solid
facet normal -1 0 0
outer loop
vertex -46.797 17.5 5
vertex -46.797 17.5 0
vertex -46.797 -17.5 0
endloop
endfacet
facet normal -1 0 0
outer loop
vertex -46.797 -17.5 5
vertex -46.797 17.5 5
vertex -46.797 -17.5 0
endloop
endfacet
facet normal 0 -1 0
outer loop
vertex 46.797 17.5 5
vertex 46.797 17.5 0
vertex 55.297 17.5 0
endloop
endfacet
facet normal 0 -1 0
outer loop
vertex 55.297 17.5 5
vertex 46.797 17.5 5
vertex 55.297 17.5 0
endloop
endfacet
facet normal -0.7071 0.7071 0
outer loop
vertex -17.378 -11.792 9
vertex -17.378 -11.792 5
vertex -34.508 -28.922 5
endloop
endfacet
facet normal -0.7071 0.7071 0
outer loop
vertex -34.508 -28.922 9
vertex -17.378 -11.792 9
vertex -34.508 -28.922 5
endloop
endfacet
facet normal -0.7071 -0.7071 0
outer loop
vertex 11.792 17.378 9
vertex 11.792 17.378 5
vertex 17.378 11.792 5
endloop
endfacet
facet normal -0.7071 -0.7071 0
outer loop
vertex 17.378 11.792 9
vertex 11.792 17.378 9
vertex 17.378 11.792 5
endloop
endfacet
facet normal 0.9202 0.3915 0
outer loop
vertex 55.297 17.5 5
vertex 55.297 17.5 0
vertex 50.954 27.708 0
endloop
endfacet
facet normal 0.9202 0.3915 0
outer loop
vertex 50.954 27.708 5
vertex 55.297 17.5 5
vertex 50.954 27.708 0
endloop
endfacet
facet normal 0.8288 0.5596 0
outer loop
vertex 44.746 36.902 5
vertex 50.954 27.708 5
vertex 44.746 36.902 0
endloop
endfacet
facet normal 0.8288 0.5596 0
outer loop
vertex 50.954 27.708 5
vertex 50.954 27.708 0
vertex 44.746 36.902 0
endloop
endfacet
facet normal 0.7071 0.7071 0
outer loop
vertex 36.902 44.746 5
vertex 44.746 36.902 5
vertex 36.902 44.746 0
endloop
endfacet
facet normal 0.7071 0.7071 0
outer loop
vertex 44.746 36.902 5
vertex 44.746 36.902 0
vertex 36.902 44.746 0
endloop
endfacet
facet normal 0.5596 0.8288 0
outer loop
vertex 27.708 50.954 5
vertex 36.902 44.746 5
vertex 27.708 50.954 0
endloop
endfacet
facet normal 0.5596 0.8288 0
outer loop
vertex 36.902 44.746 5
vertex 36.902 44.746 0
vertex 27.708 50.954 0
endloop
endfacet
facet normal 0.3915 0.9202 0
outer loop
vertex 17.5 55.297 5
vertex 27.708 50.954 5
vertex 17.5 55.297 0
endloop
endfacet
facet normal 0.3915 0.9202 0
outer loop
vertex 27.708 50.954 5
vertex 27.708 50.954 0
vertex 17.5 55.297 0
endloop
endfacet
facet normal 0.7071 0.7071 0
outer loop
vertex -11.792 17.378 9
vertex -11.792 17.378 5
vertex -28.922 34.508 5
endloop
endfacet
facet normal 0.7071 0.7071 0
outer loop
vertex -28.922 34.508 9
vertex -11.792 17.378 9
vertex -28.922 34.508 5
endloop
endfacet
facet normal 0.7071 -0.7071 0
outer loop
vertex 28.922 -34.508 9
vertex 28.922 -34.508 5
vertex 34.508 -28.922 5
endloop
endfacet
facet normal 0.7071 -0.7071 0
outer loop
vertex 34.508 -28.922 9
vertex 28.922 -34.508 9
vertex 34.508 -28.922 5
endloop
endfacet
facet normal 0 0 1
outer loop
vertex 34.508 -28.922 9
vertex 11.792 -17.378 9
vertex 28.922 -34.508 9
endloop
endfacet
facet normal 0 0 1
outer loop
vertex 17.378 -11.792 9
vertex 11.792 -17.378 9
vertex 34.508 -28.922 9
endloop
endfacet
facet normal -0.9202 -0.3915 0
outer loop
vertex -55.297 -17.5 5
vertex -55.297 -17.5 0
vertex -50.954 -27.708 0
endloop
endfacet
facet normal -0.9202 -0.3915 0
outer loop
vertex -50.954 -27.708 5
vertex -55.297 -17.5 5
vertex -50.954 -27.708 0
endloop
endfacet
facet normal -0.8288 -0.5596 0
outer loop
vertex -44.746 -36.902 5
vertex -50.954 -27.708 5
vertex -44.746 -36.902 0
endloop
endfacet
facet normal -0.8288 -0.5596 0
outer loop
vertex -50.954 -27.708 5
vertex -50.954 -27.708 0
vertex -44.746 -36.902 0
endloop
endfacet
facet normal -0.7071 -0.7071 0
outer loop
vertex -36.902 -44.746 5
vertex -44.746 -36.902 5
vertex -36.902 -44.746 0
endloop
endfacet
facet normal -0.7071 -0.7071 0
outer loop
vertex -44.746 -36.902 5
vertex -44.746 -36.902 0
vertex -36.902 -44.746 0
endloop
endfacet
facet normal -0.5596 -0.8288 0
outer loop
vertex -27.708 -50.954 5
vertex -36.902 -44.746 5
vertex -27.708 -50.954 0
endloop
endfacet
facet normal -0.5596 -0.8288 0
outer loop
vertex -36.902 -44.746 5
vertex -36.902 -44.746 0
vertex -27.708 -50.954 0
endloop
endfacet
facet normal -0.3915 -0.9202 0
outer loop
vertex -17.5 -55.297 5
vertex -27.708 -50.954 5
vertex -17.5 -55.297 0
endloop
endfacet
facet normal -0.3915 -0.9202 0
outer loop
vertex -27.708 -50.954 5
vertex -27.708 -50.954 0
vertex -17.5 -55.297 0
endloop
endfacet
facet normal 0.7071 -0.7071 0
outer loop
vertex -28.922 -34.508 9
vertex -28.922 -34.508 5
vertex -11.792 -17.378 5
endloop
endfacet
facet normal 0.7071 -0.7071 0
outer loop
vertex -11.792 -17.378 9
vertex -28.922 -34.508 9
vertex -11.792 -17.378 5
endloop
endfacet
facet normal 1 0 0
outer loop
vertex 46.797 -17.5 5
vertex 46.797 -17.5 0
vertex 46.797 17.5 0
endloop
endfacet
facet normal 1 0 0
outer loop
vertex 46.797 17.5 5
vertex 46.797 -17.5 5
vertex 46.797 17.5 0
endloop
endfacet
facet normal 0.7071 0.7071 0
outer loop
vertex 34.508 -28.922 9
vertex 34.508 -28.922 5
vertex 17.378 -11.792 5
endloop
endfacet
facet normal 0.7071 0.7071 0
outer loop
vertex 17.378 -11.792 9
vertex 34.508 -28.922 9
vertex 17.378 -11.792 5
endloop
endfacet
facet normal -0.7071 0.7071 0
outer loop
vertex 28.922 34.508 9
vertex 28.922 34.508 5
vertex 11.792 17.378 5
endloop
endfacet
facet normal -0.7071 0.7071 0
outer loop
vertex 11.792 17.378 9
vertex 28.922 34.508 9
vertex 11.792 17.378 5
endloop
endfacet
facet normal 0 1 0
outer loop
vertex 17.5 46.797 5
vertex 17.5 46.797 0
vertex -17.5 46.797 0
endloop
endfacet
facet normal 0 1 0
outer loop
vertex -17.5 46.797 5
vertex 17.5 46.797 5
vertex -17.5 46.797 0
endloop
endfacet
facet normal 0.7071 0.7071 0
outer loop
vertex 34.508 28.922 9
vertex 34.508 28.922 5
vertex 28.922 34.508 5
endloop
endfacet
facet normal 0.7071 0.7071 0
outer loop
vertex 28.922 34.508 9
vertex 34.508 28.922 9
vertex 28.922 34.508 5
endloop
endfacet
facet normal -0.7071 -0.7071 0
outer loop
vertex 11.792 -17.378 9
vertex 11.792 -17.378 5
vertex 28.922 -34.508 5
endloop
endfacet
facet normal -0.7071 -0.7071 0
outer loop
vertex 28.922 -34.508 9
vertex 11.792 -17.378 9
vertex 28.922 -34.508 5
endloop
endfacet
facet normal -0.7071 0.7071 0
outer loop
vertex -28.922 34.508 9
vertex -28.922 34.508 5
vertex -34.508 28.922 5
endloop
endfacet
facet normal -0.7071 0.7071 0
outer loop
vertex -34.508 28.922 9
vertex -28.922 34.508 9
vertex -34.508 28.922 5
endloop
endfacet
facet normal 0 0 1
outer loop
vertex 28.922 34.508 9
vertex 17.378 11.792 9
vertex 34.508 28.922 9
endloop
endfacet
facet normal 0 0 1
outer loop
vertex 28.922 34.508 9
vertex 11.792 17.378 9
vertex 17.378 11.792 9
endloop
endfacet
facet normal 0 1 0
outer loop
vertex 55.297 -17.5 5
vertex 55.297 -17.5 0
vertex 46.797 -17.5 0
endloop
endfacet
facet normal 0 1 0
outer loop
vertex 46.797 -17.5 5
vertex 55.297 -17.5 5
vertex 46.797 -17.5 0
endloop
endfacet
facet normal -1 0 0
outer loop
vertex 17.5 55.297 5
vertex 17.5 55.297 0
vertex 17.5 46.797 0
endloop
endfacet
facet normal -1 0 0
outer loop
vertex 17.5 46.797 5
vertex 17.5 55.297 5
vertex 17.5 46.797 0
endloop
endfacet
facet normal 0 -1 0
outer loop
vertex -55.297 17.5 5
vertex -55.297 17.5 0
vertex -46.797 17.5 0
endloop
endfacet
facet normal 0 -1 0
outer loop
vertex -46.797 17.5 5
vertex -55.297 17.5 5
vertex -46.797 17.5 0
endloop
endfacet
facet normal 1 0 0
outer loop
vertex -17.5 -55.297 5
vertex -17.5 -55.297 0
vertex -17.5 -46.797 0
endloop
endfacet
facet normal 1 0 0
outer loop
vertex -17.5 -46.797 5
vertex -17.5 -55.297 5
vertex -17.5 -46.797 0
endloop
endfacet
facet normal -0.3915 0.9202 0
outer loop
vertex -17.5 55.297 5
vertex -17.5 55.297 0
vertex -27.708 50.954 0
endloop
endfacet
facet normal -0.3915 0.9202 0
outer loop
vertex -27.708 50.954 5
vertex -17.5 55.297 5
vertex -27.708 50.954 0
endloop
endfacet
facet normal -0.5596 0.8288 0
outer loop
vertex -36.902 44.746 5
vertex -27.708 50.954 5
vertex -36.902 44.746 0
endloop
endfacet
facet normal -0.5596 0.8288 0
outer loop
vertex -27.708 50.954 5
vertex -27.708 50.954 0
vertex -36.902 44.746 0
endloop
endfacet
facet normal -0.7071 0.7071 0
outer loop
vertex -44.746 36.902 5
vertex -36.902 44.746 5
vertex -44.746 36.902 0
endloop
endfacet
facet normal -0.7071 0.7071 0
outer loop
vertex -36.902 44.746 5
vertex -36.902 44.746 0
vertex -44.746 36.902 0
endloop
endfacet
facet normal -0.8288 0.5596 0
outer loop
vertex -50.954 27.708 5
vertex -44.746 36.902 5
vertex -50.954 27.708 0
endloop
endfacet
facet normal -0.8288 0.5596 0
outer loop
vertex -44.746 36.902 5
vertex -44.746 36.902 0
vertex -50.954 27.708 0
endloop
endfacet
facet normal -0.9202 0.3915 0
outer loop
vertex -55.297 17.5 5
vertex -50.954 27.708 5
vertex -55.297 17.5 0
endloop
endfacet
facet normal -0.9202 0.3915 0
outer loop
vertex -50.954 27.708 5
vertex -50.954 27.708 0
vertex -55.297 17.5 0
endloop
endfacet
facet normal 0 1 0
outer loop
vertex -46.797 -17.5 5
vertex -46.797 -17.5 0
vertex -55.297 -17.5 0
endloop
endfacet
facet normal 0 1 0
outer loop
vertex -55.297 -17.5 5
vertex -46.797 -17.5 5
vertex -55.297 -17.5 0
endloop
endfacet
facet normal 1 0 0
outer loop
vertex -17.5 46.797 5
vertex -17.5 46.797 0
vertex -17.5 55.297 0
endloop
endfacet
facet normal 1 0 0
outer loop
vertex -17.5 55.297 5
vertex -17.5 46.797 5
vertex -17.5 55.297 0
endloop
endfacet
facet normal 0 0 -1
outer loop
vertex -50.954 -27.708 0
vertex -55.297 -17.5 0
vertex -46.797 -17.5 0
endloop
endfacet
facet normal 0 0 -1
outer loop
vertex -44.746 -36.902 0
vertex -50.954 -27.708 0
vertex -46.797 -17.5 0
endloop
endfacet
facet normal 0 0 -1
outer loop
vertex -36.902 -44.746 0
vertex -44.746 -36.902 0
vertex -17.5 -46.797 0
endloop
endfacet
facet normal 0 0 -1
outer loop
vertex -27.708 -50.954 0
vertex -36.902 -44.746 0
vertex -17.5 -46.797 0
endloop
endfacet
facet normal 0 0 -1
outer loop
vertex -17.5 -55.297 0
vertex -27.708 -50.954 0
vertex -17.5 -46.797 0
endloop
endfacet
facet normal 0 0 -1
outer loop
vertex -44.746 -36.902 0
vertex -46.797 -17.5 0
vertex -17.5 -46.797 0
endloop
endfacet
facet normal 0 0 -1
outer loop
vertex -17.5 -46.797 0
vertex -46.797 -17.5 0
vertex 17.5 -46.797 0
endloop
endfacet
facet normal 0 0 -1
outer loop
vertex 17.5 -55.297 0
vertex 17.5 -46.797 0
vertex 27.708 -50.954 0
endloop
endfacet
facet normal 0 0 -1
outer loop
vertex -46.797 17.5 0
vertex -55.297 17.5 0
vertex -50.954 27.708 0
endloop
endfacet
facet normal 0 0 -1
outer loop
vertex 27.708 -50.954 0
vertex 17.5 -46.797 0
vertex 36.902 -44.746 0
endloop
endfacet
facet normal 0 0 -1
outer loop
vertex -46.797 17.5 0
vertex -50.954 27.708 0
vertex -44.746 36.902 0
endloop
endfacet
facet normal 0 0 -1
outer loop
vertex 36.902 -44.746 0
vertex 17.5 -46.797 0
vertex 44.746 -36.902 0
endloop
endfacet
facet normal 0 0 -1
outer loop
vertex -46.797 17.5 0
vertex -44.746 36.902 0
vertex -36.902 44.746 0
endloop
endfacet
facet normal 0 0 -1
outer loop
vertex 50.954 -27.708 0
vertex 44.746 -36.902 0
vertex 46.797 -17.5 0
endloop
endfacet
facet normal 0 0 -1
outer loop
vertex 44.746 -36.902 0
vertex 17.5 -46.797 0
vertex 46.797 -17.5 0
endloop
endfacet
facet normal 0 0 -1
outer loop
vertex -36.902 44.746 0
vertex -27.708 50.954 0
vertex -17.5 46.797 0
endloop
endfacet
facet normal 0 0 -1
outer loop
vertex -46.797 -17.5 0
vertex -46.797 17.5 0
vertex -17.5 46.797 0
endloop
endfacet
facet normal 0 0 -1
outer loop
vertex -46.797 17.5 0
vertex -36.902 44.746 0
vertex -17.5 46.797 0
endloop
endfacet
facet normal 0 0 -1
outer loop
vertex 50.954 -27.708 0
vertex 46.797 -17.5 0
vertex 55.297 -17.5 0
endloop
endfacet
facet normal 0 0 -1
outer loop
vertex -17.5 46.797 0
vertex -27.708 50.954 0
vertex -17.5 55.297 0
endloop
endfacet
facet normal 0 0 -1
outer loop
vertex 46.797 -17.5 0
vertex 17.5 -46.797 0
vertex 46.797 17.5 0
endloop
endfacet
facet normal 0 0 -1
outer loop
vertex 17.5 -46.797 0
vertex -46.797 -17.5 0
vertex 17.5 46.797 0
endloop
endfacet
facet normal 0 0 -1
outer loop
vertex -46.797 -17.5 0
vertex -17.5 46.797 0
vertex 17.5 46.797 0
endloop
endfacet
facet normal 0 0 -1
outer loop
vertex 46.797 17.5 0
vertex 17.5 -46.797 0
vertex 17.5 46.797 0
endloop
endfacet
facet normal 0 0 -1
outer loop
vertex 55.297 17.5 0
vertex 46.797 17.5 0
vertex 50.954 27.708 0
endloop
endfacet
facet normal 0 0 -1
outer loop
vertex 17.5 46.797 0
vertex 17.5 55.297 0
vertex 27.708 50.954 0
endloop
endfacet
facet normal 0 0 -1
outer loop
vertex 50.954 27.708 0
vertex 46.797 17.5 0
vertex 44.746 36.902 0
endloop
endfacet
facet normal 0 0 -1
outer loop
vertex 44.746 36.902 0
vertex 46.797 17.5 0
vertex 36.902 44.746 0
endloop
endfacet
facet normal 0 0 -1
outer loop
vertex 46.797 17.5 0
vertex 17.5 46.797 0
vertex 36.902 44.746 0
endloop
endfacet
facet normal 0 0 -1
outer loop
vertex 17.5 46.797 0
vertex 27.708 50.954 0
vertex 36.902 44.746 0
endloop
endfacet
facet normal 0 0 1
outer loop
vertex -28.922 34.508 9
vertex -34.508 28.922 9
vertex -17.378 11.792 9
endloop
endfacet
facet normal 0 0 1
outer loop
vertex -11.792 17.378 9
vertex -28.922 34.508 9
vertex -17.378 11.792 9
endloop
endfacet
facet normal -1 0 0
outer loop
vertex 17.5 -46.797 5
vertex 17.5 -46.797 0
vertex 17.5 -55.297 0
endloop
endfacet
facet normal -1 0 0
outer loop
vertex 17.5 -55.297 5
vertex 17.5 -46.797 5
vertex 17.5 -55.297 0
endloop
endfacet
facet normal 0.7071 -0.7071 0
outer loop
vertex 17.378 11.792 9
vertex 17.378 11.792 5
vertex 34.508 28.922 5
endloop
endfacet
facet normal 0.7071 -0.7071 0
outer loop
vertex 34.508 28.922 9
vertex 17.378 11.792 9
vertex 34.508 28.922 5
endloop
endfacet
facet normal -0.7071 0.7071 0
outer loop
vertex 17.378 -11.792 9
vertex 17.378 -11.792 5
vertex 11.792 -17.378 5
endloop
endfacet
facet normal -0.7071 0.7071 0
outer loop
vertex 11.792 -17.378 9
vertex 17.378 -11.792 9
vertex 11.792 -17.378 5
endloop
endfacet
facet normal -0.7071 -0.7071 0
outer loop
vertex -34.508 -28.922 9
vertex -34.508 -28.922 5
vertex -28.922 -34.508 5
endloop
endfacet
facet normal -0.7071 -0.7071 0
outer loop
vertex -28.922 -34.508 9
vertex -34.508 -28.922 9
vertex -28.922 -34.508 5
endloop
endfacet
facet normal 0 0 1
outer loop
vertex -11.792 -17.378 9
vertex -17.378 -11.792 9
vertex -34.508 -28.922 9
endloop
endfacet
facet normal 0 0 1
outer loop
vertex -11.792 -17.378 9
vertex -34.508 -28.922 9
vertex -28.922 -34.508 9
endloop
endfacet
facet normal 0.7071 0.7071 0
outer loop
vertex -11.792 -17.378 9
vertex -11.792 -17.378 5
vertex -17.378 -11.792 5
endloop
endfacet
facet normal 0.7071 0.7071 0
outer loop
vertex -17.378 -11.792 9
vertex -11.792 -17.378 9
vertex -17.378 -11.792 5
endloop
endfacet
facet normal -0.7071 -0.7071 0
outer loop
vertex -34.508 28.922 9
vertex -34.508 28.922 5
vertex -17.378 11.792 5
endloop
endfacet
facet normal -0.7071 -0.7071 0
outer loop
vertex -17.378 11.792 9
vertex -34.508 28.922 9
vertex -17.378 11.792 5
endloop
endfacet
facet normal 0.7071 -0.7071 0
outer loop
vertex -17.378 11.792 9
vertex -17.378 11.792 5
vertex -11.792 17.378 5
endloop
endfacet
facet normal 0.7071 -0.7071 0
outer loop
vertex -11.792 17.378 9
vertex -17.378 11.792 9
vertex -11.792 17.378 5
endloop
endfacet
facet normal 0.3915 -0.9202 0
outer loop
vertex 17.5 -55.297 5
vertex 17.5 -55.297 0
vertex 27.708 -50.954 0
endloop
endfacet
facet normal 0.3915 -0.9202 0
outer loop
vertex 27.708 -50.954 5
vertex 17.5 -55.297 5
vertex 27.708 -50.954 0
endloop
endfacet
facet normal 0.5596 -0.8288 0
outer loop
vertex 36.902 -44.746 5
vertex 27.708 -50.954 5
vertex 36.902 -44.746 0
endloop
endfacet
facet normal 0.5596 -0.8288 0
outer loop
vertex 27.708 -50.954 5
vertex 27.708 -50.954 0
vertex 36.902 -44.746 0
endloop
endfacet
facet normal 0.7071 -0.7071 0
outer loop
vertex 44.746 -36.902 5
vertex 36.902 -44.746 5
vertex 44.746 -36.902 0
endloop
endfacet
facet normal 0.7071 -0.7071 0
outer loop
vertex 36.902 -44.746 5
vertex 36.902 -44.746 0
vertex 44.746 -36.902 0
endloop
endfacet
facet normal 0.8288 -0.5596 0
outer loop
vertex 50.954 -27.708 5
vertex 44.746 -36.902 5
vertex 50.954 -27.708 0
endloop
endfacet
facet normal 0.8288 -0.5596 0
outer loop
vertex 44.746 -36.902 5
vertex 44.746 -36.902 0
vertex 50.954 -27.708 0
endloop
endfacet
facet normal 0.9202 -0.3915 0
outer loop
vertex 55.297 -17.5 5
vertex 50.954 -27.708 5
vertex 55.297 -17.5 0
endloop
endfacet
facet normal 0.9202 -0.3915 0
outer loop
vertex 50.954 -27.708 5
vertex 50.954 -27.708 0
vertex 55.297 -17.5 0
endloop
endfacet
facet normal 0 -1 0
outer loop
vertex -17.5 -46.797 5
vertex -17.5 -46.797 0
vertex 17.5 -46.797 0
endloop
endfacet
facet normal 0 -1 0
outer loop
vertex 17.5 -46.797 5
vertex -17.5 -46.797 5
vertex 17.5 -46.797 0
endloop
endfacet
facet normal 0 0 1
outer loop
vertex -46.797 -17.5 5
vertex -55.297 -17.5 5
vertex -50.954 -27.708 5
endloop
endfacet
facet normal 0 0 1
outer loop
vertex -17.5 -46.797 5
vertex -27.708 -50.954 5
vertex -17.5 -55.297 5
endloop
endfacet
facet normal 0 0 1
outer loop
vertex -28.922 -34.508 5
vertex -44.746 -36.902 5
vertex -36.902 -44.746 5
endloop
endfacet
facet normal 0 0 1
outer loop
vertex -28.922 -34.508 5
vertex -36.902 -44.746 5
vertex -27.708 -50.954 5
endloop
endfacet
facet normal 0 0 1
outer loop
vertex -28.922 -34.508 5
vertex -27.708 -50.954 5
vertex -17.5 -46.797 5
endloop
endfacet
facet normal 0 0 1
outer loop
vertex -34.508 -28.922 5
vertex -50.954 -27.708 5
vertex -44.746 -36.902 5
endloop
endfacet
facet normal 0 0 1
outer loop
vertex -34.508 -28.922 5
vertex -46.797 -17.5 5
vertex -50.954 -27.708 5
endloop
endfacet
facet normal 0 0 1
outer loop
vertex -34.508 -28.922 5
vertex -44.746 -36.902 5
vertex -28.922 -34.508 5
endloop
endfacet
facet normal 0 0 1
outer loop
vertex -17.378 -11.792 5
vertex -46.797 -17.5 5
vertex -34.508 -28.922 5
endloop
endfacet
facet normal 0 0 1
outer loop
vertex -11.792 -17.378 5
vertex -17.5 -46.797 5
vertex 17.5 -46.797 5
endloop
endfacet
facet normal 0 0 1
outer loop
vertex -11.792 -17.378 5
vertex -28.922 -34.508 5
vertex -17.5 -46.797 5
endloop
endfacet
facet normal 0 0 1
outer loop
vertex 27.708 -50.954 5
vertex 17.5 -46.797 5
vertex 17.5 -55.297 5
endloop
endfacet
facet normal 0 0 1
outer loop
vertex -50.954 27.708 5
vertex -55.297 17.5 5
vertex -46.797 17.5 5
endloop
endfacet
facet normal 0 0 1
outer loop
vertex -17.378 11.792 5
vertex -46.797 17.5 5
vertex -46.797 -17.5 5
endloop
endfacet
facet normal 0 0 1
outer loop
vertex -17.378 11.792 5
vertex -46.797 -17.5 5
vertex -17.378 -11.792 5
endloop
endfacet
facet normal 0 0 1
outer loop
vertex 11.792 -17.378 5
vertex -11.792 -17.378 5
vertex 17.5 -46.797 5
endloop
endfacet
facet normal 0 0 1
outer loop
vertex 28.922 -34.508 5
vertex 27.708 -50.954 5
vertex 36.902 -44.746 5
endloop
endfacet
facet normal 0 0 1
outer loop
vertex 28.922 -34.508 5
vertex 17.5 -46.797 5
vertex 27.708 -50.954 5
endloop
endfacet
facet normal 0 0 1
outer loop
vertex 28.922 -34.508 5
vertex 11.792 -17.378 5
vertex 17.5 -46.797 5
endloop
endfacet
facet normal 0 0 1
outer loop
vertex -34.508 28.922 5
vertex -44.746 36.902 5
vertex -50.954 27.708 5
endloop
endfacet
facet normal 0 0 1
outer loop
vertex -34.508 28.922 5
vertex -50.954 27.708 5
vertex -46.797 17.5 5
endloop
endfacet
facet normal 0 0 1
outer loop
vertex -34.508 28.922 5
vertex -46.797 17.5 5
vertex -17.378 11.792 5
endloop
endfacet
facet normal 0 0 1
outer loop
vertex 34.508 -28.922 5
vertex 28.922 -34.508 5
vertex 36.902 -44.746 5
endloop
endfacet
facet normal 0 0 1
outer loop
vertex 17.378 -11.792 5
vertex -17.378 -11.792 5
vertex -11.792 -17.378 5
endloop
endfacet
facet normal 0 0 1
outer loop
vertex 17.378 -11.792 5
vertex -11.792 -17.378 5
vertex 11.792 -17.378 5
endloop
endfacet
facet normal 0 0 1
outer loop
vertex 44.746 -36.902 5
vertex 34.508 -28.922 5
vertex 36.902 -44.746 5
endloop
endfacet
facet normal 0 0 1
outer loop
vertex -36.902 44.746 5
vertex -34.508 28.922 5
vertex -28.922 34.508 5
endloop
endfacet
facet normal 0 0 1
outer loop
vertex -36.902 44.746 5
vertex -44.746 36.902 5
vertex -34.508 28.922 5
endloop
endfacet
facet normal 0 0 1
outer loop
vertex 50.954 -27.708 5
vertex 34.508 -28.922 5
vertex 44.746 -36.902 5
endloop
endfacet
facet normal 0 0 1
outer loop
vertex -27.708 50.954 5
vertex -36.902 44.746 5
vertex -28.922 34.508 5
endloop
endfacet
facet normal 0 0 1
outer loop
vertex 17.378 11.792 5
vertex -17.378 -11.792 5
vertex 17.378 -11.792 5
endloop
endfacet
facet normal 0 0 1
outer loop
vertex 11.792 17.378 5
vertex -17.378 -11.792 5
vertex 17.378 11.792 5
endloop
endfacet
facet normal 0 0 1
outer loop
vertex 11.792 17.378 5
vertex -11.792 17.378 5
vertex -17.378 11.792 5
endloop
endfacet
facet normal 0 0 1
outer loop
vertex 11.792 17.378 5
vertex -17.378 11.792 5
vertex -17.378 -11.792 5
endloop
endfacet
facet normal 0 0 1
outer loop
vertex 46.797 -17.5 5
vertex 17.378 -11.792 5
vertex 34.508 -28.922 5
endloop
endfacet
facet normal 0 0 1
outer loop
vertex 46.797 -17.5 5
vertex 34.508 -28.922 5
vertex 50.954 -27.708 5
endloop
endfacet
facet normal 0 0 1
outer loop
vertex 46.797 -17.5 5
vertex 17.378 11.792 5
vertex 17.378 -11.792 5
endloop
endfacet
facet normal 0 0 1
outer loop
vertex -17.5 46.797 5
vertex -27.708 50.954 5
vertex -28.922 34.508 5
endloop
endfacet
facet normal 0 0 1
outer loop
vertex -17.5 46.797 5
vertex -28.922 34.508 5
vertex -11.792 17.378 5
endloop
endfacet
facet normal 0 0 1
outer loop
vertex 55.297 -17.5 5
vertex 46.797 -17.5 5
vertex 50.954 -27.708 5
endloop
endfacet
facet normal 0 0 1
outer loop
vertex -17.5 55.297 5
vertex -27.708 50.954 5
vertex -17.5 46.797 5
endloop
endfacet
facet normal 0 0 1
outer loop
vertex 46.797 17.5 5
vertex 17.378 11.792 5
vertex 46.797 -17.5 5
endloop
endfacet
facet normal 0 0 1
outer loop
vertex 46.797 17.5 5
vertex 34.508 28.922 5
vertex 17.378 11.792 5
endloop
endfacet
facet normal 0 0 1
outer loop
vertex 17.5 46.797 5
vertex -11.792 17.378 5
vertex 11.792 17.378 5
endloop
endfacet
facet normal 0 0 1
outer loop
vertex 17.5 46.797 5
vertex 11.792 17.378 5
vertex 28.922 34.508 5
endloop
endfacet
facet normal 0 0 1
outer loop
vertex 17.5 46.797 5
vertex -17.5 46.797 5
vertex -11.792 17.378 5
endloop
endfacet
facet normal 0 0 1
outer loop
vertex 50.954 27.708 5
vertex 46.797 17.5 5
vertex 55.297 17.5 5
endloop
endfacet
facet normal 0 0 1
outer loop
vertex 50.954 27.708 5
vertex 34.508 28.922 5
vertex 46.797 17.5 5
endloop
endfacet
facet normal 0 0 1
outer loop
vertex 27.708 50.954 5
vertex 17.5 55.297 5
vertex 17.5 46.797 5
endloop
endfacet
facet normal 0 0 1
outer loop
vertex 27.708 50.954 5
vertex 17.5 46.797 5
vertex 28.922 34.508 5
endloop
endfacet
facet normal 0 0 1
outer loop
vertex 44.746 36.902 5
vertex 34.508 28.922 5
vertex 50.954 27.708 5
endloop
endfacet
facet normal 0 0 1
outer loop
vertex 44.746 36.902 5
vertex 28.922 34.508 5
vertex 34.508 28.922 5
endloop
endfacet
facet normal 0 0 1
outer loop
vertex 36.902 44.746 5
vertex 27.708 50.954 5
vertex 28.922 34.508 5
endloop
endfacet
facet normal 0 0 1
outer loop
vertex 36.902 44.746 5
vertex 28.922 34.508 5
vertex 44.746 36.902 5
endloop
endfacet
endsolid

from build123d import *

# Parameters (mm, degrees)
F1_DEPTH = 5
F3_DEPTH = 4


with BuildPart() as f1:
    # F0 (on Top) → F1 (new body)
    with BuildSketch(Plane.XY):
        with BuildLine():
            Line((46.796926, 17.5), (55.296926, 17.5))
            ThreePointArc((55.296926, 17.5), (41.012193, 41.012193), (17.5, 55.296926))
            Line((17.5, 55.296926), (17.5, 46.796926))
            Line((17.5, 46.796926), (-17.5, 46.796926))
            Line((-17.5, 46.796926), (-17.5, 55.296926))
            ThreePointArc((-17.5, 55.296926), (-41.012193, 41.012193), (-55.296926, 17.5))
            Line((-55.296926, 17.5), (-46.796926, 17.5))
            Line((-46.796926, 17.5), (-46.796926, -17.5))
            Line((-46.796926, -17.5), (-55.296926, -17.5))
            ThreePointArc((-55.296926, -17.5), (-41.012193, -41.012193), (-17.5, -55.296926))
            Line((-17.5, -55.296926), (-17.5, -46.796926))
            Line((-17.5, -46.796926), (17.5, -46.796926))
            Line((17.5, -46.796926), (17.5, -55.296926))
            ThreePointArc((17.5, -55.296926), (41.012193, -41.012193), (55.296926, -17.5))
            Line((55.296926, -17.5), (46.796926, -17.5))
            Line((46.796926, -17.5), (46.796926, 17.5))
        make_face()
    extrude(amount=F1_DEPTH)

    # F2 (on face) → F3 (join)
    with BuildSketch(Plane.XY.offset(5)):
        Polygon((-28.921893, 34.50774), (-34.50774, 28.921893), (-17.377576, 11.791728), (-11.791728, 17.377576), align=None)
        Polygon((17.377576, 11.791728), (34.50774, 28.921893), (28.921893, 34.50774), (11.791728, 17.377576), align=None)
        Polygon((11.791728, -17.377576), (28.921893, -34.50774), (34.50774, -28.921893), (17.377576, -11.791728), align=None)
        Polygon((-17.377576, -11.791728), (-34.50774, -28.921893), (-28.921893, -34.50774), (-11.791728, -17.377576), align=None)
    extrude(amount=F3_DEPTH)


solid = f1.part
